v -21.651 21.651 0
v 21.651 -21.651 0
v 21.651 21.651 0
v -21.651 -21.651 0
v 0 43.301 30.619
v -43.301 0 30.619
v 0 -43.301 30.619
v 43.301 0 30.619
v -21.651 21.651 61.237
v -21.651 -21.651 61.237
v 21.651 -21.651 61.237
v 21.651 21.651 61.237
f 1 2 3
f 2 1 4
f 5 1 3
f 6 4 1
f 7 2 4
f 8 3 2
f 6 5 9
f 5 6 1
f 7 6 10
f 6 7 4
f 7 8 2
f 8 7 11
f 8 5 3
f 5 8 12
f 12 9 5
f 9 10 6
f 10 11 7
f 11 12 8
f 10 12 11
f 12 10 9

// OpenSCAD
// The triangles for the cuboctodren were inscribed in a circle of radius
// 50.
p0 = 50;
qx = -p0 / 2;
qy = p0 * sqrt(3) / 2;
dx = p0 - qx;
side = sqrt(dx * dx + qy * qy) / 2;
echo(side);
h1 = side / sqrt(2);
h2 = side * sqrt(2);

r0 = side / 2;
r1 = r0 * 2;

polyhedron(
    points=[
        [ r0,  r0, 0],
        [-r0,  r0, 0],
        [-r0, -r0, 0],
        [ r0, -r0, 0],
        [  0,  r1, h1],
        [-r1,   0, h1],
        [  0, -r1, h1],
        [ r1,   0, h1],
        [ r0,  r0, h2],
        [-r0,  r0, h2],
        [-r0, -r0, h2],
        [ r0, -r0, h2]],
    faces = [
        [ 0, 3, 2, 1],
        [ 0, 1, 4],
        [ 1, 2, 5],
        [ 2, 3, 6],
        [ 3, 0, 7],
        [ 4, 1, 5,  9],
        [ 5, 2, 6, 10],
        [ 6, 3, 7, 11],
        [ 7, 0, 4,  8],
        [ 4,  9,  8],
        [ 5, 10,  9],
        [ 6, 11, 10],
        [ 7,  8, 11],
        [ 8, 9, 10, 11]]);
